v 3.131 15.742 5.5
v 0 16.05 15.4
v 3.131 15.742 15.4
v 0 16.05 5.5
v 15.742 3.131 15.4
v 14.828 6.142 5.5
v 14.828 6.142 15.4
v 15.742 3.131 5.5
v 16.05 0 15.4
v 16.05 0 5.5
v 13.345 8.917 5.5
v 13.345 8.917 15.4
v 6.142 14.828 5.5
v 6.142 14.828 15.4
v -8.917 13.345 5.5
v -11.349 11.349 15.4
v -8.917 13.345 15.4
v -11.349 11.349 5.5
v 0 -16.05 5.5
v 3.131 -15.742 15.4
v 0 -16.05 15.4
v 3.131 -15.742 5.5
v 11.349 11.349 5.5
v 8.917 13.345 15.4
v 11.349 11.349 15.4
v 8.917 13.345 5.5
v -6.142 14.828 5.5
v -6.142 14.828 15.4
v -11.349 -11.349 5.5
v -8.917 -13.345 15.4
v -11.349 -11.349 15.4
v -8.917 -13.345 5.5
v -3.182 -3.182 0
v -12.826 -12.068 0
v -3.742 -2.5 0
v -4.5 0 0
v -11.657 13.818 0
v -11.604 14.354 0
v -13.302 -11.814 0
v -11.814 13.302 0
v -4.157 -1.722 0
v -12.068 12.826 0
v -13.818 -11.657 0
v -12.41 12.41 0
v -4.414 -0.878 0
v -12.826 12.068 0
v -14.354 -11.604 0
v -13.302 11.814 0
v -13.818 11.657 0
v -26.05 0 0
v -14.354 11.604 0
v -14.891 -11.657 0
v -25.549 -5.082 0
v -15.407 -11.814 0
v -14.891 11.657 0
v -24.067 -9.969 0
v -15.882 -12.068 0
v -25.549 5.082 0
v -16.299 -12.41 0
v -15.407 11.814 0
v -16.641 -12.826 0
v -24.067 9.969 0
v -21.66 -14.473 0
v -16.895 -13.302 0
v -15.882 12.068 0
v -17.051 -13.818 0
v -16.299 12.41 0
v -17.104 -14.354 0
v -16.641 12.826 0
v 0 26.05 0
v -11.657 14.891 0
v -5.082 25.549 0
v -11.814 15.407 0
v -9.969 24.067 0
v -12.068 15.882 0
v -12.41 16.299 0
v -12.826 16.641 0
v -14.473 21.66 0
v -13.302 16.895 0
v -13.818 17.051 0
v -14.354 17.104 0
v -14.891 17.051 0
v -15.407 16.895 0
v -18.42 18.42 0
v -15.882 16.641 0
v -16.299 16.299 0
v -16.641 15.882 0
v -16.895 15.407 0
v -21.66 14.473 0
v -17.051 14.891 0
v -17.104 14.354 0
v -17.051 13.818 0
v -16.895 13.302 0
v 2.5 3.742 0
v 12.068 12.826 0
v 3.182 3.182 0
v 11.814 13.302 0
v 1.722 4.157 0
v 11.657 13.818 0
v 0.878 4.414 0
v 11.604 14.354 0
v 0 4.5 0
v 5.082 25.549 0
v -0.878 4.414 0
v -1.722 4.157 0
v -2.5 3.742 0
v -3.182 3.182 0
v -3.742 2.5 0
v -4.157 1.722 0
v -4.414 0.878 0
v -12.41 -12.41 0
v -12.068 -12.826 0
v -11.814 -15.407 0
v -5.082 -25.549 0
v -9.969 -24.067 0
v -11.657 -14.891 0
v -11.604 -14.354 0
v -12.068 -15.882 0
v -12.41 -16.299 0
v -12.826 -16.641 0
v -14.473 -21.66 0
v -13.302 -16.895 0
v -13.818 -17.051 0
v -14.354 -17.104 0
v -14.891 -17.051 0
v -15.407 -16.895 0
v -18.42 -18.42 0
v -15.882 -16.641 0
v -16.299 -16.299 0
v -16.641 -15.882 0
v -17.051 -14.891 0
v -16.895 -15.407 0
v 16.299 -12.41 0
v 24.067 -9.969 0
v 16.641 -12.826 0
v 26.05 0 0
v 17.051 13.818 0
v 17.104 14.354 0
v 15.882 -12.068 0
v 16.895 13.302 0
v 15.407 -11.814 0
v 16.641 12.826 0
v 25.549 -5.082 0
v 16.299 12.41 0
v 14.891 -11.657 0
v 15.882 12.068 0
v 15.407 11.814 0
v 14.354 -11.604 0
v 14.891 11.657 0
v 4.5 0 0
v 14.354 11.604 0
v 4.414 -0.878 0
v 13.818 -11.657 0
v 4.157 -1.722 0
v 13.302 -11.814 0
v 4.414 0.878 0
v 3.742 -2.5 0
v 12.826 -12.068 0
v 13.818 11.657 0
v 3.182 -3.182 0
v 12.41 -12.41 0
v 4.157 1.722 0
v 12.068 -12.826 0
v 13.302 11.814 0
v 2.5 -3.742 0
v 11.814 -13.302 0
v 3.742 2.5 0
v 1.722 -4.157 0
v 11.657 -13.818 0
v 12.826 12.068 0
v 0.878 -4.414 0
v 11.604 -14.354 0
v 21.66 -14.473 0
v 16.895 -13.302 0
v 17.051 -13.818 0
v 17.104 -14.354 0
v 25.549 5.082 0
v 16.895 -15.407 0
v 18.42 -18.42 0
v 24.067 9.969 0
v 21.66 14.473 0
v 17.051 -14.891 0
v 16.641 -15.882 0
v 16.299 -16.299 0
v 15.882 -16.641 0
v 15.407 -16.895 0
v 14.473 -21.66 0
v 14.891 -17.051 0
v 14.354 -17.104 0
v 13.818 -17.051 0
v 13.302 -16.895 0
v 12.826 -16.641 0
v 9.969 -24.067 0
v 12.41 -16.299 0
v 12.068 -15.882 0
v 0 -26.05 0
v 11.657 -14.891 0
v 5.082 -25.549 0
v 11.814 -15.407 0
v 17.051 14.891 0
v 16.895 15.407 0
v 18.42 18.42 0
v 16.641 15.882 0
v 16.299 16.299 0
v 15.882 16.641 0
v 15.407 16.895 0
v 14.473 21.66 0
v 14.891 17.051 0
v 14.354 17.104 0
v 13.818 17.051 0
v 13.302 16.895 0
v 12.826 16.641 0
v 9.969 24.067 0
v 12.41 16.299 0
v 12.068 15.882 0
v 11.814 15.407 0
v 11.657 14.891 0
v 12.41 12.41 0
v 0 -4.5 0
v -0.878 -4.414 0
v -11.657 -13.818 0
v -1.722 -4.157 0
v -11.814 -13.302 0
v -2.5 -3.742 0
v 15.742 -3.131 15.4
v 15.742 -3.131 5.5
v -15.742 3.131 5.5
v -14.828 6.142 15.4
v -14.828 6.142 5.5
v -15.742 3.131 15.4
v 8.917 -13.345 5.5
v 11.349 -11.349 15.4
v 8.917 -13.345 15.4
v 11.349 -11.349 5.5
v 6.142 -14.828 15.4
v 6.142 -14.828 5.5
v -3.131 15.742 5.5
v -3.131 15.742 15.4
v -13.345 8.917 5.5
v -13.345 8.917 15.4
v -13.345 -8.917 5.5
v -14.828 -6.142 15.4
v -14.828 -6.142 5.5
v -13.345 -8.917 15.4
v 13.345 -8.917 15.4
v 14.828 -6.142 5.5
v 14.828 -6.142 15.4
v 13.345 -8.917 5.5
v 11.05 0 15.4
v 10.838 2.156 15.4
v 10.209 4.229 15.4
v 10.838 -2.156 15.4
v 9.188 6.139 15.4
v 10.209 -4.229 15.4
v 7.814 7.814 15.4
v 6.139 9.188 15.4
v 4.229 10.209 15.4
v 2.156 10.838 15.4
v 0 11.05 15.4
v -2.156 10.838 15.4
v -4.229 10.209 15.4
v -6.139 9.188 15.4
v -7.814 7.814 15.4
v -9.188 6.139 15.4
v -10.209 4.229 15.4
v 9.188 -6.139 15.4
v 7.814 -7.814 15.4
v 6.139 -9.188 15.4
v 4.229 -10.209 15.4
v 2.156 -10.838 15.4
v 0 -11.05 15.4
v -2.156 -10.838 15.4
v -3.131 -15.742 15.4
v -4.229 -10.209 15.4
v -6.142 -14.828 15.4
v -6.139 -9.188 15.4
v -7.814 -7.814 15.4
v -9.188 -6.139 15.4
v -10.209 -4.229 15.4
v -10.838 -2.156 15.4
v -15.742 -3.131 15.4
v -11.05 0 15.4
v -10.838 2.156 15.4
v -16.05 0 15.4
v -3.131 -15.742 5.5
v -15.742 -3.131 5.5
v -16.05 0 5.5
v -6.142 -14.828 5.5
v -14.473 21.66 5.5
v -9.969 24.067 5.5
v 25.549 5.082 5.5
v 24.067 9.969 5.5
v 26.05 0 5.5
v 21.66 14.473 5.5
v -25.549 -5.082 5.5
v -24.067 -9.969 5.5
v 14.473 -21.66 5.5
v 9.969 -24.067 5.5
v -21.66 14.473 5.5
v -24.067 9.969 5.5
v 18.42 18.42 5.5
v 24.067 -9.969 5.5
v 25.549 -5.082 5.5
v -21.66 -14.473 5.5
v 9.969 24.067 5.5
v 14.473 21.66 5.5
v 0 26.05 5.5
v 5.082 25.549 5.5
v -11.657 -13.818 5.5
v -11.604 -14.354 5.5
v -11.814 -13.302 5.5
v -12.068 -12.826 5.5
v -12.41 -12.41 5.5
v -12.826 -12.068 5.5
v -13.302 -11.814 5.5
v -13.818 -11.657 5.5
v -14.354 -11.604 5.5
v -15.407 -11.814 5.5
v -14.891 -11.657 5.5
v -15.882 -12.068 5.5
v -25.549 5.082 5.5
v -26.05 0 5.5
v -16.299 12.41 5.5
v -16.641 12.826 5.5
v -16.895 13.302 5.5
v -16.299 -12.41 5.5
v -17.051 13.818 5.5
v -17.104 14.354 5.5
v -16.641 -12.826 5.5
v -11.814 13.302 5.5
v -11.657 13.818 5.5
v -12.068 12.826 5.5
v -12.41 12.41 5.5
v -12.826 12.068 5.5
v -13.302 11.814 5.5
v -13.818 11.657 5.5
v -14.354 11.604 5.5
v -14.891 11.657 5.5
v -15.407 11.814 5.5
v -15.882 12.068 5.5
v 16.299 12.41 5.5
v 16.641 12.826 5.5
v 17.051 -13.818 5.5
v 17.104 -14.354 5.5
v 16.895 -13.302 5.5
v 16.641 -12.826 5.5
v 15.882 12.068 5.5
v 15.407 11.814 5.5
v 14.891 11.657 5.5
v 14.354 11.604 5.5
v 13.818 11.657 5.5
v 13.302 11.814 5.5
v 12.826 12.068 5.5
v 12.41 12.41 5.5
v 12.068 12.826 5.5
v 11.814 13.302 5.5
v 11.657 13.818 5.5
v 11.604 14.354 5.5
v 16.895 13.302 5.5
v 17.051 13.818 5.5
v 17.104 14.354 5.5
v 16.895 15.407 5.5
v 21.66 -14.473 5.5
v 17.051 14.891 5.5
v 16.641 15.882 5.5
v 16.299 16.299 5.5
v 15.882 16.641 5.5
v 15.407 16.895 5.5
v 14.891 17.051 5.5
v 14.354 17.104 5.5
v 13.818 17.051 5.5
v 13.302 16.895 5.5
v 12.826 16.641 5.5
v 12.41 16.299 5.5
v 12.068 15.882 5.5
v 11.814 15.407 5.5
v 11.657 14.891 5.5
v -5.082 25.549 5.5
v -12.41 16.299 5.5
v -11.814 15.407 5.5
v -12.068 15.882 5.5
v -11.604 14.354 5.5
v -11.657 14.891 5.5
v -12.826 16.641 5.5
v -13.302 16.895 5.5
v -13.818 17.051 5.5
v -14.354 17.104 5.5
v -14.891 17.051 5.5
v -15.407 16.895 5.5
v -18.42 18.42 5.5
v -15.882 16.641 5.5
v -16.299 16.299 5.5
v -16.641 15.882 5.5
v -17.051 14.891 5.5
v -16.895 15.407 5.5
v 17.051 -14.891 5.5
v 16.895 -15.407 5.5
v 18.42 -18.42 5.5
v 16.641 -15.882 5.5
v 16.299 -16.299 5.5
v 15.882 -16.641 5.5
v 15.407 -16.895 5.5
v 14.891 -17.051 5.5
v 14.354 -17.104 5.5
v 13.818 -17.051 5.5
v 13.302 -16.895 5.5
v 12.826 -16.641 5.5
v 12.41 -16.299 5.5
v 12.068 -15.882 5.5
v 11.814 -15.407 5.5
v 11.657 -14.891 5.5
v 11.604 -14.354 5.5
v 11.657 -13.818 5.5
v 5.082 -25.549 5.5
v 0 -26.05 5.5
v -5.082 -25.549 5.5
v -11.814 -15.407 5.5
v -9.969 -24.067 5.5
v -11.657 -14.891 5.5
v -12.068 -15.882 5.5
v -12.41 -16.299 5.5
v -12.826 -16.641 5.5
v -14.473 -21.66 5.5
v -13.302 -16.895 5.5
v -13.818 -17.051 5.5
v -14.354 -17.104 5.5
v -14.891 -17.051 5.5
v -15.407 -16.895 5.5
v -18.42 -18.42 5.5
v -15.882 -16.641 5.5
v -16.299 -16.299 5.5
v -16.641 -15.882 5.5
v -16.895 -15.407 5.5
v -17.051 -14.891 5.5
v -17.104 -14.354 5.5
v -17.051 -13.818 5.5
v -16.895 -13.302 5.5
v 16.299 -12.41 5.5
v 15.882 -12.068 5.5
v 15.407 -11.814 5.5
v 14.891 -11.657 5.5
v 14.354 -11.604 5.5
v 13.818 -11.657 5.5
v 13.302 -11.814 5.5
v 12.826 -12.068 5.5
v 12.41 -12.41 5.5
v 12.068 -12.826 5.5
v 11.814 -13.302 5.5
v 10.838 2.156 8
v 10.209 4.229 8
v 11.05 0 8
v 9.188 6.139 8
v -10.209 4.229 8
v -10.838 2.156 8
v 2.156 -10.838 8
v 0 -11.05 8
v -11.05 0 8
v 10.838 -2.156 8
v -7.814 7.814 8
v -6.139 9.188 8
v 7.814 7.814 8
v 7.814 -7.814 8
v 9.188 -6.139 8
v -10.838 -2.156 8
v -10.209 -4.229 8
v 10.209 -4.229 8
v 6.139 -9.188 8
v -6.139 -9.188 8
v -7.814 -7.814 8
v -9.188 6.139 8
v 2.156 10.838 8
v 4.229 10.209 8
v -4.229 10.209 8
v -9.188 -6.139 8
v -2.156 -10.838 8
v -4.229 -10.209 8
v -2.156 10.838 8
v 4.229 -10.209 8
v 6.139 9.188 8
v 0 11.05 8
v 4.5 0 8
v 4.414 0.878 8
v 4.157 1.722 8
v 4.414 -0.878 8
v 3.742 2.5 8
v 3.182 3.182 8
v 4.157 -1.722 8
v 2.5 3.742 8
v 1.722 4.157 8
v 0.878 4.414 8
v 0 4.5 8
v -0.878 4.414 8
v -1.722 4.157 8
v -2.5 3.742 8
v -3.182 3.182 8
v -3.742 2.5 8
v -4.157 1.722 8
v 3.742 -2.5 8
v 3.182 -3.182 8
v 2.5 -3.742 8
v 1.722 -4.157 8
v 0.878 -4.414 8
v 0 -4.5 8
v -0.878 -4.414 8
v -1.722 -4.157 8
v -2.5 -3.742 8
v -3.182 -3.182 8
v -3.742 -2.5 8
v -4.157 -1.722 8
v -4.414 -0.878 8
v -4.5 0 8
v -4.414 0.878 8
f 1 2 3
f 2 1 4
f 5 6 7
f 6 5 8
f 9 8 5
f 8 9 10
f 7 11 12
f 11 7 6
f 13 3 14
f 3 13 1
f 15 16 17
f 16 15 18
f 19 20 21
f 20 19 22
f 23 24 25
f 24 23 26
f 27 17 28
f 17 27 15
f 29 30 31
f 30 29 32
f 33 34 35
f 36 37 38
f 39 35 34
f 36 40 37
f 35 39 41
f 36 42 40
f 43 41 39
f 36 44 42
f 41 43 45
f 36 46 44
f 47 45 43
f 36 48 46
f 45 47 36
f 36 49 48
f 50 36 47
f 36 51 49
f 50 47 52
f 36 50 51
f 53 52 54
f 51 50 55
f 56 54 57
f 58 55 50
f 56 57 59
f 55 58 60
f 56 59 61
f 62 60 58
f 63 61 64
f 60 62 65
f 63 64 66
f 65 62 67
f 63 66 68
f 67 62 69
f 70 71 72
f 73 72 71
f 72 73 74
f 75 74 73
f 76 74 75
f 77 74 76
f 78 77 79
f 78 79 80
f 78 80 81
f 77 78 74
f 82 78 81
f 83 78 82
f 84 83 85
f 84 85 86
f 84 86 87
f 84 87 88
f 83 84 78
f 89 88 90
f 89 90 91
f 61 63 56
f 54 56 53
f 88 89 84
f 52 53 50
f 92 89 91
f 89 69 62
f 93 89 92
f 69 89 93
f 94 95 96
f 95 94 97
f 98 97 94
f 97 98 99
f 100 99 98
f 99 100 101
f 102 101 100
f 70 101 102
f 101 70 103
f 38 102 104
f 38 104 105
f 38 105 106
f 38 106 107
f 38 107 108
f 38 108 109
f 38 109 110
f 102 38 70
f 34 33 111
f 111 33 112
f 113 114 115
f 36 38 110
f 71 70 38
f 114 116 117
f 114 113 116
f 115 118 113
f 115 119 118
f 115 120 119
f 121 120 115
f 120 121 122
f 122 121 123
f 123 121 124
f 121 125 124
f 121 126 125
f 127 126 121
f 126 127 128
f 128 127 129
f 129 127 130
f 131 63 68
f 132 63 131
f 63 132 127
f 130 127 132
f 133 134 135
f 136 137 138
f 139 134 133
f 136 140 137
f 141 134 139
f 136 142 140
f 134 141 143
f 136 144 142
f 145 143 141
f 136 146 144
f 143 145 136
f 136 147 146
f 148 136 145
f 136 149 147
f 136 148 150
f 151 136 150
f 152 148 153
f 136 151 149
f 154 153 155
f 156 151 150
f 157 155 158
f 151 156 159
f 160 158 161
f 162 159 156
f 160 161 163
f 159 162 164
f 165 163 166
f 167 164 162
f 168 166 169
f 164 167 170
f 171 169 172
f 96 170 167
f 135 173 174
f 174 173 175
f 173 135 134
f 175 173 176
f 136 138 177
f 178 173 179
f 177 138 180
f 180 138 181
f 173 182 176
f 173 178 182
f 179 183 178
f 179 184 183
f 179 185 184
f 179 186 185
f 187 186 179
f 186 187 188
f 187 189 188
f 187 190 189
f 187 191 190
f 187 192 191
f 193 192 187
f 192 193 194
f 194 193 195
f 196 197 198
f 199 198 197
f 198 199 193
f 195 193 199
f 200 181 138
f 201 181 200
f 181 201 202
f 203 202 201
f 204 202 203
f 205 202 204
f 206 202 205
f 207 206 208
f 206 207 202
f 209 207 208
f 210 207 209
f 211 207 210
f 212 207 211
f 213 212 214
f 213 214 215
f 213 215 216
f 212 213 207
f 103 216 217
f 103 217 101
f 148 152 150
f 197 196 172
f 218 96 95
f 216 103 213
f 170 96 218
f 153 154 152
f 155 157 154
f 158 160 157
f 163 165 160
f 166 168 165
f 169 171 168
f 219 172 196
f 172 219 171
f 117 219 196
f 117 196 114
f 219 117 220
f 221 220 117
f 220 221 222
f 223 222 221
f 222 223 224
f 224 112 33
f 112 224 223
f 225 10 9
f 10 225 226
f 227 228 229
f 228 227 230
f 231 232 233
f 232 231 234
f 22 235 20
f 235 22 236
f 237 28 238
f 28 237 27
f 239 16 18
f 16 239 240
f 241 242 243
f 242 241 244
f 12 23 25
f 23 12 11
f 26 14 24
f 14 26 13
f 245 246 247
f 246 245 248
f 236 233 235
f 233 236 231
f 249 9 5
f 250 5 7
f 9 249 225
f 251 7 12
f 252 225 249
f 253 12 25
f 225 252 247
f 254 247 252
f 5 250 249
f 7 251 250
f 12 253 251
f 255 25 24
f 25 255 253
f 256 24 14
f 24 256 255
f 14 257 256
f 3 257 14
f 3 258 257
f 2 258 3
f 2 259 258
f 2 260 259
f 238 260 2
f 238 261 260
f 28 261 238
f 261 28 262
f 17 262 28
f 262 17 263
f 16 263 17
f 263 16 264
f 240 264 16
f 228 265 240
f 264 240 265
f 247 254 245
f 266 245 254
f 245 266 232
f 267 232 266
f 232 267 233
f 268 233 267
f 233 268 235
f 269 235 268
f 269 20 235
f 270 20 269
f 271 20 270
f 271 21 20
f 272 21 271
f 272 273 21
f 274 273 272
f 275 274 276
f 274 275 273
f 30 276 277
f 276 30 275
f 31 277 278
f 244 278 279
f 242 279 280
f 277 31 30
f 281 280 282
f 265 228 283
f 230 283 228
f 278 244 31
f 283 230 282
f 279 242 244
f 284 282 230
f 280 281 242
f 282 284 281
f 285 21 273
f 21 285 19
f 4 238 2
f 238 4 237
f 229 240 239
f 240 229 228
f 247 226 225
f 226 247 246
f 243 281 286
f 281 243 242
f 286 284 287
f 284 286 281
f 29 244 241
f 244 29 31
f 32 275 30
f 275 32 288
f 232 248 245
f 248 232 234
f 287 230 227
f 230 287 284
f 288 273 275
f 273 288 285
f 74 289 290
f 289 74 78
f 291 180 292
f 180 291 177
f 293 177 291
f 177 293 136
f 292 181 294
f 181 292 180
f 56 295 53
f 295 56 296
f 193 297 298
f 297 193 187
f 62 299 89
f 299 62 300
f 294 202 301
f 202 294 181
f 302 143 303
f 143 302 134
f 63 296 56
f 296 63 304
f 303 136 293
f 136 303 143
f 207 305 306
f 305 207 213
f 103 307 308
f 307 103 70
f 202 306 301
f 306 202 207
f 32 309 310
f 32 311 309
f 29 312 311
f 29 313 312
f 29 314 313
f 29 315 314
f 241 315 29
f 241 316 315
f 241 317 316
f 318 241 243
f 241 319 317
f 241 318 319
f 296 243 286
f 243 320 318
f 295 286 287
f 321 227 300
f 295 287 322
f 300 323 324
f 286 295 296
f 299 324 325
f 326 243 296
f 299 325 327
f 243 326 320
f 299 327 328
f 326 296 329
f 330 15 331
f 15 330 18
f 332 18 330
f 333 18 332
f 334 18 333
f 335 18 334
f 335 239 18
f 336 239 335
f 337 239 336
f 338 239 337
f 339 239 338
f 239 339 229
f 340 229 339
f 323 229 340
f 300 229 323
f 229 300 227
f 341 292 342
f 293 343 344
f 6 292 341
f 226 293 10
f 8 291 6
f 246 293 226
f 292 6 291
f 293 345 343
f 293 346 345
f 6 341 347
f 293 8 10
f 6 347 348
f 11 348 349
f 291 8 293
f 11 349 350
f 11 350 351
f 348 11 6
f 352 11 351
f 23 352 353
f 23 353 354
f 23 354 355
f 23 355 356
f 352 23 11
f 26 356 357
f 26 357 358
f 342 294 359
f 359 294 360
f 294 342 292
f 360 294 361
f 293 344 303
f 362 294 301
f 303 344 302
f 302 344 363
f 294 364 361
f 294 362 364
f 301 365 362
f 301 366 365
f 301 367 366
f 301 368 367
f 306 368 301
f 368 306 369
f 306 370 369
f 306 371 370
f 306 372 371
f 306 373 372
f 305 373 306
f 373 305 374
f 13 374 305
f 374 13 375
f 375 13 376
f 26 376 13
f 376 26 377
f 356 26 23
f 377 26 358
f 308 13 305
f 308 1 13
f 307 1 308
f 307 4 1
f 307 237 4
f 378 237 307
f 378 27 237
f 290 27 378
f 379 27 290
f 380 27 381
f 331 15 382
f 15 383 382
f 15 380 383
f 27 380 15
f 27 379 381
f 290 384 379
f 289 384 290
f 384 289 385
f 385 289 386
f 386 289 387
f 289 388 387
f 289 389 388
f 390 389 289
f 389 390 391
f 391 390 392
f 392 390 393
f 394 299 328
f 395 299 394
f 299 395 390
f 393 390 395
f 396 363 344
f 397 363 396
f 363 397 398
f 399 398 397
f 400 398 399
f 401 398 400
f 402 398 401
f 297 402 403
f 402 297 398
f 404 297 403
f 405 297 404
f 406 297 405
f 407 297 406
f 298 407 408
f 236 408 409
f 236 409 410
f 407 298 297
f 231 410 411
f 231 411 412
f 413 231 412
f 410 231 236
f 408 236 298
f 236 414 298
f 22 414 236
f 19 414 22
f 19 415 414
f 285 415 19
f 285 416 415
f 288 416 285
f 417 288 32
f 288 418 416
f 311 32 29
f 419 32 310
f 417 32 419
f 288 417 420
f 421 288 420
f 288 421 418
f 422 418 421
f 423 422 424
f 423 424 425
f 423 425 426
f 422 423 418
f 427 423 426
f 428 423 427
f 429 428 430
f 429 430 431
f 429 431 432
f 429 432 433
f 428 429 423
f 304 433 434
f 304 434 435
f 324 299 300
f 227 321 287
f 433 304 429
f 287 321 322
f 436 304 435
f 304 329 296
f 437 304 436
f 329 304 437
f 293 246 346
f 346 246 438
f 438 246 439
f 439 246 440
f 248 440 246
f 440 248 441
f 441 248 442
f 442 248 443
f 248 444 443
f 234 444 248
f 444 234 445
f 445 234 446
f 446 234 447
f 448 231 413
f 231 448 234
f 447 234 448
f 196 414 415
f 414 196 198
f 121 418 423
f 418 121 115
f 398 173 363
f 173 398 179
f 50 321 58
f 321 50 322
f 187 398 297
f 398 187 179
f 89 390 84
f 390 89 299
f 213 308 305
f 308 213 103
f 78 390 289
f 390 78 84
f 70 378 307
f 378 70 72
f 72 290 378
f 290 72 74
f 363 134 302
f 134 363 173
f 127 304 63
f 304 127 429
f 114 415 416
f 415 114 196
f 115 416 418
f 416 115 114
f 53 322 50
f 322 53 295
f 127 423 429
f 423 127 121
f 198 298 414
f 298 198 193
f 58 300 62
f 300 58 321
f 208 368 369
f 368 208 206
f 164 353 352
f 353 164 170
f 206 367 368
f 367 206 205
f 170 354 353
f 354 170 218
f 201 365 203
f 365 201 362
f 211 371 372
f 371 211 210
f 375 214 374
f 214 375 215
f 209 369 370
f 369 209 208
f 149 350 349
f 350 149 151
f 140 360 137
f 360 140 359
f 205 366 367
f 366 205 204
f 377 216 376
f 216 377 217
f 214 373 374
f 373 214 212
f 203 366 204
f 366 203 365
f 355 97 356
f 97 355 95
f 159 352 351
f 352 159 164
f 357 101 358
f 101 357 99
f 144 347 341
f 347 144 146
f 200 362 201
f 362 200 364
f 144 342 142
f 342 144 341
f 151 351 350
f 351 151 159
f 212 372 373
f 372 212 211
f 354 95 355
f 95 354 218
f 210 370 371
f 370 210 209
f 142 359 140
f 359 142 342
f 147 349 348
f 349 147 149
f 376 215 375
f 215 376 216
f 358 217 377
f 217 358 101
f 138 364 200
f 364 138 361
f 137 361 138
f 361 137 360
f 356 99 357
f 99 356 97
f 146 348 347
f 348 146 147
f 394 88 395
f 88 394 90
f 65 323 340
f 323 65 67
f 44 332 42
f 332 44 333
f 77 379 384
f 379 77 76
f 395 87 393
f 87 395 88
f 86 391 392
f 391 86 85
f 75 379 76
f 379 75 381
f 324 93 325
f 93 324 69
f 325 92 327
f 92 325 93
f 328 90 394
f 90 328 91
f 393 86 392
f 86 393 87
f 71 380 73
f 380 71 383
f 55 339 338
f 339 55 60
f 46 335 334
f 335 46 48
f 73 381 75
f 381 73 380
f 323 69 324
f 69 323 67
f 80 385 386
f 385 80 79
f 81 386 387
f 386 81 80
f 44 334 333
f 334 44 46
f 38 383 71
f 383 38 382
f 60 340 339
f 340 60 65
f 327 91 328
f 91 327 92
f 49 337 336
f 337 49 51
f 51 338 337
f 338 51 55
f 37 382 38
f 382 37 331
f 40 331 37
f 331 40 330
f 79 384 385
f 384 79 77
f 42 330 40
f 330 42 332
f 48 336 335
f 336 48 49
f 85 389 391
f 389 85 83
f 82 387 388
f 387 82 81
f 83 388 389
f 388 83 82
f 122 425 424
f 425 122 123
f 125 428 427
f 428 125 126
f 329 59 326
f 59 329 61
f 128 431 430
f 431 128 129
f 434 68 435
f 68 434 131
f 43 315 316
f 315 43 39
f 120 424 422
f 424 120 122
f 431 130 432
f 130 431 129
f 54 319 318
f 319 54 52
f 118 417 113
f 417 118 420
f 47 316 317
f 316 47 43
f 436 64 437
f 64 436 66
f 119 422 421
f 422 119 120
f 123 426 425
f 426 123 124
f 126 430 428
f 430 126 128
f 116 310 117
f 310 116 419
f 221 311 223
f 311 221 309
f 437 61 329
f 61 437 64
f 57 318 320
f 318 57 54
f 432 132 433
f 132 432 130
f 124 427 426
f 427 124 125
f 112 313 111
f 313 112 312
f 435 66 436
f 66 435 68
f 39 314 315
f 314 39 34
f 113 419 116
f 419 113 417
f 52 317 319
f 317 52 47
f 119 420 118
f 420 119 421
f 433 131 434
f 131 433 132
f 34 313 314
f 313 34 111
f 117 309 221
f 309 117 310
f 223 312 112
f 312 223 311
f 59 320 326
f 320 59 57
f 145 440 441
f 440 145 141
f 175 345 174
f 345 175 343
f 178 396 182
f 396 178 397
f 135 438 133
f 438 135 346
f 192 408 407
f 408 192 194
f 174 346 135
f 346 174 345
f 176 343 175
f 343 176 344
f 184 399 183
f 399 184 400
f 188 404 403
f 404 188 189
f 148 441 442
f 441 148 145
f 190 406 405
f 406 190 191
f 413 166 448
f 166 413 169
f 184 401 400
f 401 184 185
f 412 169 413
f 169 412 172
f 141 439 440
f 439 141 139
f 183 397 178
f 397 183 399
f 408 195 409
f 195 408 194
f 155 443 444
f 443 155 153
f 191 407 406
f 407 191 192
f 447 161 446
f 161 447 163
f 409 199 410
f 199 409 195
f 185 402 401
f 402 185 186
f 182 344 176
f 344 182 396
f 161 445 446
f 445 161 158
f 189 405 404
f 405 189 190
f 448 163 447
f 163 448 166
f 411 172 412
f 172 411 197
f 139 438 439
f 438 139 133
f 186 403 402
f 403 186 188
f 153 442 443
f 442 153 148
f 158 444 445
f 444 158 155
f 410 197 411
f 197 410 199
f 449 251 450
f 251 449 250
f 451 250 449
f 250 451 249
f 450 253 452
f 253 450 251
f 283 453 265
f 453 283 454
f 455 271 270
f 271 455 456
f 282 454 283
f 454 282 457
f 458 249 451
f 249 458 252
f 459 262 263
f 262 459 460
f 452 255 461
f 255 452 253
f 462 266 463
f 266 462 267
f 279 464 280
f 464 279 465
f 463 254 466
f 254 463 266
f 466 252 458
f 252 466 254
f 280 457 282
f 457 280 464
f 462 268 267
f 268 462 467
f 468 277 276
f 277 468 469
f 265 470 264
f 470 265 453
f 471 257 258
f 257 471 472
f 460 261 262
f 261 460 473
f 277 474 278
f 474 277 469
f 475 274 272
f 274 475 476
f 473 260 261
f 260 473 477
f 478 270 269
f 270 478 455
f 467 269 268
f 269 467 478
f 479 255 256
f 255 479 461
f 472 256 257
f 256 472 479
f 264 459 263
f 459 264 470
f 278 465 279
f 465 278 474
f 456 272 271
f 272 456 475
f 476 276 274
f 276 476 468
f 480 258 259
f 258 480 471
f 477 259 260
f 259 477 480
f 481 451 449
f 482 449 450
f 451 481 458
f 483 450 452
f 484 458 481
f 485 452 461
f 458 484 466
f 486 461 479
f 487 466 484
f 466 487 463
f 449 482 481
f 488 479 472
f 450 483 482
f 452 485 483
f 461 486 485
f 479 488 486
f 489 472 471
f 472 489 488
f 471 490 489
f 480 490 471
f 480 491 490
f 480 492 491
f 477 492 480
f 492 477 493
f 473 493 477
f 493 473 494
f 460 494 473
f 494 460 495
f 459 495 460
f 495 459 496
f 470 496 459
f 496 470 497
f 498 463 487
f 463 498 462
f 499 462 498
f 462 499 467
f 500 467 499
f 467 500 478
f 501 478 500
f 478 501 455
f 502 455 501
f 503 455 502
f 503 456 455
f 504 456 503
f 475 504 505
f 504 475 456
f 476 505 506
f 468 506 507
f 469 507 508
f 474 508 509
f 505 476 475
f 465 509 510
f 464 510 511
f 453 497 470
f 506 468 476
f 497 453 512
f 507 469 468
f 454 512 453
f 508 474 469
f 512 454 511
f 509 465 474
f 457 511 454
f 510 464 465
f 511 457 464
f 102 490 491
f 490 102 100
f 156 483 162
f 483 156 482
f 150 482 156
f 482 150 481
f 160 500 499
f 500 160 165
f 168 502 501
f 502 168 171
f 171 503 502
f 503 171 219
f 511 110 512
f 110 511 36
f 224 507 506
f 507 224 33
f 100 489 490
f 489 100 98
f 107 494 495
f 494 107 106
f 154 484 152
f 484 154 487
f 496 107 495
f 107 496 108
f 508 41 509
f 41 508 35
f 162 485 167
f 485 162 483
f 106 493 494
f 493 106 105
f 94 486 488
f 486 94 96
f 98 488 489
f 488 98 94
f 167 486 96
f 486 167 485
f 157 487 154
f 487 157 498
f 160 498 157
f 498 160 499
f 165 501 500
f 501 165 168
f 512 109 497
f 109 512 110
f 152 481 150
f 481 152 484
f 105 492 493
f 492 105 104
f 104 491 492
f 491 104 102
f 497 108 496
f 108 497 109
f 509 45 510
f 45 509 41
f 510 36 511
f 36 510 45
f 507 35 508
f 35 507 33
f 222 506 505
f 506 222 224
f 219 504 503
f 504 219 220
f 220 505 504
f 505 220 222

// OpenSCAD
$fn = 32;

// ----------------------------------------------------------------------
// Bearing housing: seat for 608 (22 x 7 mm), 32.1 mm body
// ----------------------------------------------------------------------

// --- parameters (mm) ---
case_d = 32.1;            // housing outside diameter
case_h = 15.4;            // overall housing height
rim_t = 5;                // wall thickness
bearing_seat = 22.1;      // 608 seat, 0.1 mm clearance
seat_h = 7.4;             // pocket depth
shoulder = 4;             // shoulder under the bearing
pass_d = 9;               // shaft passage
ear_d = 52.1;             // mounting flange diameter
flange_t = 4;             // flange thickness
bolt_d = 5.5;             // flange bolt clearance
bolt_r = 20.3;            // flange bolt circle radius

module body() {
  cylinder(h = case_h, d = case_d);
}

module flange() {
  /* flange sunk 1.5 mm into the body */
  cylinder(h = flange_t + 1.5, d = ear_d);
}

difference() {
  union() {
    body();
    flange();
  }
  translate([0, 0, case_h - seat_h]) cylinder(h = seat_h + 1, d = bearing_seat);
  translate([0, 0, -1]) cylinder(h = case_h - seat_h + 1, d = pass_d);
  for (i = [0 : 3]) rotate([0, 0, 45 + i * 90]) translate([bolt_r, 0, -1])
    cylinder(h = flange_t + 3, d = bolt_d);
}
